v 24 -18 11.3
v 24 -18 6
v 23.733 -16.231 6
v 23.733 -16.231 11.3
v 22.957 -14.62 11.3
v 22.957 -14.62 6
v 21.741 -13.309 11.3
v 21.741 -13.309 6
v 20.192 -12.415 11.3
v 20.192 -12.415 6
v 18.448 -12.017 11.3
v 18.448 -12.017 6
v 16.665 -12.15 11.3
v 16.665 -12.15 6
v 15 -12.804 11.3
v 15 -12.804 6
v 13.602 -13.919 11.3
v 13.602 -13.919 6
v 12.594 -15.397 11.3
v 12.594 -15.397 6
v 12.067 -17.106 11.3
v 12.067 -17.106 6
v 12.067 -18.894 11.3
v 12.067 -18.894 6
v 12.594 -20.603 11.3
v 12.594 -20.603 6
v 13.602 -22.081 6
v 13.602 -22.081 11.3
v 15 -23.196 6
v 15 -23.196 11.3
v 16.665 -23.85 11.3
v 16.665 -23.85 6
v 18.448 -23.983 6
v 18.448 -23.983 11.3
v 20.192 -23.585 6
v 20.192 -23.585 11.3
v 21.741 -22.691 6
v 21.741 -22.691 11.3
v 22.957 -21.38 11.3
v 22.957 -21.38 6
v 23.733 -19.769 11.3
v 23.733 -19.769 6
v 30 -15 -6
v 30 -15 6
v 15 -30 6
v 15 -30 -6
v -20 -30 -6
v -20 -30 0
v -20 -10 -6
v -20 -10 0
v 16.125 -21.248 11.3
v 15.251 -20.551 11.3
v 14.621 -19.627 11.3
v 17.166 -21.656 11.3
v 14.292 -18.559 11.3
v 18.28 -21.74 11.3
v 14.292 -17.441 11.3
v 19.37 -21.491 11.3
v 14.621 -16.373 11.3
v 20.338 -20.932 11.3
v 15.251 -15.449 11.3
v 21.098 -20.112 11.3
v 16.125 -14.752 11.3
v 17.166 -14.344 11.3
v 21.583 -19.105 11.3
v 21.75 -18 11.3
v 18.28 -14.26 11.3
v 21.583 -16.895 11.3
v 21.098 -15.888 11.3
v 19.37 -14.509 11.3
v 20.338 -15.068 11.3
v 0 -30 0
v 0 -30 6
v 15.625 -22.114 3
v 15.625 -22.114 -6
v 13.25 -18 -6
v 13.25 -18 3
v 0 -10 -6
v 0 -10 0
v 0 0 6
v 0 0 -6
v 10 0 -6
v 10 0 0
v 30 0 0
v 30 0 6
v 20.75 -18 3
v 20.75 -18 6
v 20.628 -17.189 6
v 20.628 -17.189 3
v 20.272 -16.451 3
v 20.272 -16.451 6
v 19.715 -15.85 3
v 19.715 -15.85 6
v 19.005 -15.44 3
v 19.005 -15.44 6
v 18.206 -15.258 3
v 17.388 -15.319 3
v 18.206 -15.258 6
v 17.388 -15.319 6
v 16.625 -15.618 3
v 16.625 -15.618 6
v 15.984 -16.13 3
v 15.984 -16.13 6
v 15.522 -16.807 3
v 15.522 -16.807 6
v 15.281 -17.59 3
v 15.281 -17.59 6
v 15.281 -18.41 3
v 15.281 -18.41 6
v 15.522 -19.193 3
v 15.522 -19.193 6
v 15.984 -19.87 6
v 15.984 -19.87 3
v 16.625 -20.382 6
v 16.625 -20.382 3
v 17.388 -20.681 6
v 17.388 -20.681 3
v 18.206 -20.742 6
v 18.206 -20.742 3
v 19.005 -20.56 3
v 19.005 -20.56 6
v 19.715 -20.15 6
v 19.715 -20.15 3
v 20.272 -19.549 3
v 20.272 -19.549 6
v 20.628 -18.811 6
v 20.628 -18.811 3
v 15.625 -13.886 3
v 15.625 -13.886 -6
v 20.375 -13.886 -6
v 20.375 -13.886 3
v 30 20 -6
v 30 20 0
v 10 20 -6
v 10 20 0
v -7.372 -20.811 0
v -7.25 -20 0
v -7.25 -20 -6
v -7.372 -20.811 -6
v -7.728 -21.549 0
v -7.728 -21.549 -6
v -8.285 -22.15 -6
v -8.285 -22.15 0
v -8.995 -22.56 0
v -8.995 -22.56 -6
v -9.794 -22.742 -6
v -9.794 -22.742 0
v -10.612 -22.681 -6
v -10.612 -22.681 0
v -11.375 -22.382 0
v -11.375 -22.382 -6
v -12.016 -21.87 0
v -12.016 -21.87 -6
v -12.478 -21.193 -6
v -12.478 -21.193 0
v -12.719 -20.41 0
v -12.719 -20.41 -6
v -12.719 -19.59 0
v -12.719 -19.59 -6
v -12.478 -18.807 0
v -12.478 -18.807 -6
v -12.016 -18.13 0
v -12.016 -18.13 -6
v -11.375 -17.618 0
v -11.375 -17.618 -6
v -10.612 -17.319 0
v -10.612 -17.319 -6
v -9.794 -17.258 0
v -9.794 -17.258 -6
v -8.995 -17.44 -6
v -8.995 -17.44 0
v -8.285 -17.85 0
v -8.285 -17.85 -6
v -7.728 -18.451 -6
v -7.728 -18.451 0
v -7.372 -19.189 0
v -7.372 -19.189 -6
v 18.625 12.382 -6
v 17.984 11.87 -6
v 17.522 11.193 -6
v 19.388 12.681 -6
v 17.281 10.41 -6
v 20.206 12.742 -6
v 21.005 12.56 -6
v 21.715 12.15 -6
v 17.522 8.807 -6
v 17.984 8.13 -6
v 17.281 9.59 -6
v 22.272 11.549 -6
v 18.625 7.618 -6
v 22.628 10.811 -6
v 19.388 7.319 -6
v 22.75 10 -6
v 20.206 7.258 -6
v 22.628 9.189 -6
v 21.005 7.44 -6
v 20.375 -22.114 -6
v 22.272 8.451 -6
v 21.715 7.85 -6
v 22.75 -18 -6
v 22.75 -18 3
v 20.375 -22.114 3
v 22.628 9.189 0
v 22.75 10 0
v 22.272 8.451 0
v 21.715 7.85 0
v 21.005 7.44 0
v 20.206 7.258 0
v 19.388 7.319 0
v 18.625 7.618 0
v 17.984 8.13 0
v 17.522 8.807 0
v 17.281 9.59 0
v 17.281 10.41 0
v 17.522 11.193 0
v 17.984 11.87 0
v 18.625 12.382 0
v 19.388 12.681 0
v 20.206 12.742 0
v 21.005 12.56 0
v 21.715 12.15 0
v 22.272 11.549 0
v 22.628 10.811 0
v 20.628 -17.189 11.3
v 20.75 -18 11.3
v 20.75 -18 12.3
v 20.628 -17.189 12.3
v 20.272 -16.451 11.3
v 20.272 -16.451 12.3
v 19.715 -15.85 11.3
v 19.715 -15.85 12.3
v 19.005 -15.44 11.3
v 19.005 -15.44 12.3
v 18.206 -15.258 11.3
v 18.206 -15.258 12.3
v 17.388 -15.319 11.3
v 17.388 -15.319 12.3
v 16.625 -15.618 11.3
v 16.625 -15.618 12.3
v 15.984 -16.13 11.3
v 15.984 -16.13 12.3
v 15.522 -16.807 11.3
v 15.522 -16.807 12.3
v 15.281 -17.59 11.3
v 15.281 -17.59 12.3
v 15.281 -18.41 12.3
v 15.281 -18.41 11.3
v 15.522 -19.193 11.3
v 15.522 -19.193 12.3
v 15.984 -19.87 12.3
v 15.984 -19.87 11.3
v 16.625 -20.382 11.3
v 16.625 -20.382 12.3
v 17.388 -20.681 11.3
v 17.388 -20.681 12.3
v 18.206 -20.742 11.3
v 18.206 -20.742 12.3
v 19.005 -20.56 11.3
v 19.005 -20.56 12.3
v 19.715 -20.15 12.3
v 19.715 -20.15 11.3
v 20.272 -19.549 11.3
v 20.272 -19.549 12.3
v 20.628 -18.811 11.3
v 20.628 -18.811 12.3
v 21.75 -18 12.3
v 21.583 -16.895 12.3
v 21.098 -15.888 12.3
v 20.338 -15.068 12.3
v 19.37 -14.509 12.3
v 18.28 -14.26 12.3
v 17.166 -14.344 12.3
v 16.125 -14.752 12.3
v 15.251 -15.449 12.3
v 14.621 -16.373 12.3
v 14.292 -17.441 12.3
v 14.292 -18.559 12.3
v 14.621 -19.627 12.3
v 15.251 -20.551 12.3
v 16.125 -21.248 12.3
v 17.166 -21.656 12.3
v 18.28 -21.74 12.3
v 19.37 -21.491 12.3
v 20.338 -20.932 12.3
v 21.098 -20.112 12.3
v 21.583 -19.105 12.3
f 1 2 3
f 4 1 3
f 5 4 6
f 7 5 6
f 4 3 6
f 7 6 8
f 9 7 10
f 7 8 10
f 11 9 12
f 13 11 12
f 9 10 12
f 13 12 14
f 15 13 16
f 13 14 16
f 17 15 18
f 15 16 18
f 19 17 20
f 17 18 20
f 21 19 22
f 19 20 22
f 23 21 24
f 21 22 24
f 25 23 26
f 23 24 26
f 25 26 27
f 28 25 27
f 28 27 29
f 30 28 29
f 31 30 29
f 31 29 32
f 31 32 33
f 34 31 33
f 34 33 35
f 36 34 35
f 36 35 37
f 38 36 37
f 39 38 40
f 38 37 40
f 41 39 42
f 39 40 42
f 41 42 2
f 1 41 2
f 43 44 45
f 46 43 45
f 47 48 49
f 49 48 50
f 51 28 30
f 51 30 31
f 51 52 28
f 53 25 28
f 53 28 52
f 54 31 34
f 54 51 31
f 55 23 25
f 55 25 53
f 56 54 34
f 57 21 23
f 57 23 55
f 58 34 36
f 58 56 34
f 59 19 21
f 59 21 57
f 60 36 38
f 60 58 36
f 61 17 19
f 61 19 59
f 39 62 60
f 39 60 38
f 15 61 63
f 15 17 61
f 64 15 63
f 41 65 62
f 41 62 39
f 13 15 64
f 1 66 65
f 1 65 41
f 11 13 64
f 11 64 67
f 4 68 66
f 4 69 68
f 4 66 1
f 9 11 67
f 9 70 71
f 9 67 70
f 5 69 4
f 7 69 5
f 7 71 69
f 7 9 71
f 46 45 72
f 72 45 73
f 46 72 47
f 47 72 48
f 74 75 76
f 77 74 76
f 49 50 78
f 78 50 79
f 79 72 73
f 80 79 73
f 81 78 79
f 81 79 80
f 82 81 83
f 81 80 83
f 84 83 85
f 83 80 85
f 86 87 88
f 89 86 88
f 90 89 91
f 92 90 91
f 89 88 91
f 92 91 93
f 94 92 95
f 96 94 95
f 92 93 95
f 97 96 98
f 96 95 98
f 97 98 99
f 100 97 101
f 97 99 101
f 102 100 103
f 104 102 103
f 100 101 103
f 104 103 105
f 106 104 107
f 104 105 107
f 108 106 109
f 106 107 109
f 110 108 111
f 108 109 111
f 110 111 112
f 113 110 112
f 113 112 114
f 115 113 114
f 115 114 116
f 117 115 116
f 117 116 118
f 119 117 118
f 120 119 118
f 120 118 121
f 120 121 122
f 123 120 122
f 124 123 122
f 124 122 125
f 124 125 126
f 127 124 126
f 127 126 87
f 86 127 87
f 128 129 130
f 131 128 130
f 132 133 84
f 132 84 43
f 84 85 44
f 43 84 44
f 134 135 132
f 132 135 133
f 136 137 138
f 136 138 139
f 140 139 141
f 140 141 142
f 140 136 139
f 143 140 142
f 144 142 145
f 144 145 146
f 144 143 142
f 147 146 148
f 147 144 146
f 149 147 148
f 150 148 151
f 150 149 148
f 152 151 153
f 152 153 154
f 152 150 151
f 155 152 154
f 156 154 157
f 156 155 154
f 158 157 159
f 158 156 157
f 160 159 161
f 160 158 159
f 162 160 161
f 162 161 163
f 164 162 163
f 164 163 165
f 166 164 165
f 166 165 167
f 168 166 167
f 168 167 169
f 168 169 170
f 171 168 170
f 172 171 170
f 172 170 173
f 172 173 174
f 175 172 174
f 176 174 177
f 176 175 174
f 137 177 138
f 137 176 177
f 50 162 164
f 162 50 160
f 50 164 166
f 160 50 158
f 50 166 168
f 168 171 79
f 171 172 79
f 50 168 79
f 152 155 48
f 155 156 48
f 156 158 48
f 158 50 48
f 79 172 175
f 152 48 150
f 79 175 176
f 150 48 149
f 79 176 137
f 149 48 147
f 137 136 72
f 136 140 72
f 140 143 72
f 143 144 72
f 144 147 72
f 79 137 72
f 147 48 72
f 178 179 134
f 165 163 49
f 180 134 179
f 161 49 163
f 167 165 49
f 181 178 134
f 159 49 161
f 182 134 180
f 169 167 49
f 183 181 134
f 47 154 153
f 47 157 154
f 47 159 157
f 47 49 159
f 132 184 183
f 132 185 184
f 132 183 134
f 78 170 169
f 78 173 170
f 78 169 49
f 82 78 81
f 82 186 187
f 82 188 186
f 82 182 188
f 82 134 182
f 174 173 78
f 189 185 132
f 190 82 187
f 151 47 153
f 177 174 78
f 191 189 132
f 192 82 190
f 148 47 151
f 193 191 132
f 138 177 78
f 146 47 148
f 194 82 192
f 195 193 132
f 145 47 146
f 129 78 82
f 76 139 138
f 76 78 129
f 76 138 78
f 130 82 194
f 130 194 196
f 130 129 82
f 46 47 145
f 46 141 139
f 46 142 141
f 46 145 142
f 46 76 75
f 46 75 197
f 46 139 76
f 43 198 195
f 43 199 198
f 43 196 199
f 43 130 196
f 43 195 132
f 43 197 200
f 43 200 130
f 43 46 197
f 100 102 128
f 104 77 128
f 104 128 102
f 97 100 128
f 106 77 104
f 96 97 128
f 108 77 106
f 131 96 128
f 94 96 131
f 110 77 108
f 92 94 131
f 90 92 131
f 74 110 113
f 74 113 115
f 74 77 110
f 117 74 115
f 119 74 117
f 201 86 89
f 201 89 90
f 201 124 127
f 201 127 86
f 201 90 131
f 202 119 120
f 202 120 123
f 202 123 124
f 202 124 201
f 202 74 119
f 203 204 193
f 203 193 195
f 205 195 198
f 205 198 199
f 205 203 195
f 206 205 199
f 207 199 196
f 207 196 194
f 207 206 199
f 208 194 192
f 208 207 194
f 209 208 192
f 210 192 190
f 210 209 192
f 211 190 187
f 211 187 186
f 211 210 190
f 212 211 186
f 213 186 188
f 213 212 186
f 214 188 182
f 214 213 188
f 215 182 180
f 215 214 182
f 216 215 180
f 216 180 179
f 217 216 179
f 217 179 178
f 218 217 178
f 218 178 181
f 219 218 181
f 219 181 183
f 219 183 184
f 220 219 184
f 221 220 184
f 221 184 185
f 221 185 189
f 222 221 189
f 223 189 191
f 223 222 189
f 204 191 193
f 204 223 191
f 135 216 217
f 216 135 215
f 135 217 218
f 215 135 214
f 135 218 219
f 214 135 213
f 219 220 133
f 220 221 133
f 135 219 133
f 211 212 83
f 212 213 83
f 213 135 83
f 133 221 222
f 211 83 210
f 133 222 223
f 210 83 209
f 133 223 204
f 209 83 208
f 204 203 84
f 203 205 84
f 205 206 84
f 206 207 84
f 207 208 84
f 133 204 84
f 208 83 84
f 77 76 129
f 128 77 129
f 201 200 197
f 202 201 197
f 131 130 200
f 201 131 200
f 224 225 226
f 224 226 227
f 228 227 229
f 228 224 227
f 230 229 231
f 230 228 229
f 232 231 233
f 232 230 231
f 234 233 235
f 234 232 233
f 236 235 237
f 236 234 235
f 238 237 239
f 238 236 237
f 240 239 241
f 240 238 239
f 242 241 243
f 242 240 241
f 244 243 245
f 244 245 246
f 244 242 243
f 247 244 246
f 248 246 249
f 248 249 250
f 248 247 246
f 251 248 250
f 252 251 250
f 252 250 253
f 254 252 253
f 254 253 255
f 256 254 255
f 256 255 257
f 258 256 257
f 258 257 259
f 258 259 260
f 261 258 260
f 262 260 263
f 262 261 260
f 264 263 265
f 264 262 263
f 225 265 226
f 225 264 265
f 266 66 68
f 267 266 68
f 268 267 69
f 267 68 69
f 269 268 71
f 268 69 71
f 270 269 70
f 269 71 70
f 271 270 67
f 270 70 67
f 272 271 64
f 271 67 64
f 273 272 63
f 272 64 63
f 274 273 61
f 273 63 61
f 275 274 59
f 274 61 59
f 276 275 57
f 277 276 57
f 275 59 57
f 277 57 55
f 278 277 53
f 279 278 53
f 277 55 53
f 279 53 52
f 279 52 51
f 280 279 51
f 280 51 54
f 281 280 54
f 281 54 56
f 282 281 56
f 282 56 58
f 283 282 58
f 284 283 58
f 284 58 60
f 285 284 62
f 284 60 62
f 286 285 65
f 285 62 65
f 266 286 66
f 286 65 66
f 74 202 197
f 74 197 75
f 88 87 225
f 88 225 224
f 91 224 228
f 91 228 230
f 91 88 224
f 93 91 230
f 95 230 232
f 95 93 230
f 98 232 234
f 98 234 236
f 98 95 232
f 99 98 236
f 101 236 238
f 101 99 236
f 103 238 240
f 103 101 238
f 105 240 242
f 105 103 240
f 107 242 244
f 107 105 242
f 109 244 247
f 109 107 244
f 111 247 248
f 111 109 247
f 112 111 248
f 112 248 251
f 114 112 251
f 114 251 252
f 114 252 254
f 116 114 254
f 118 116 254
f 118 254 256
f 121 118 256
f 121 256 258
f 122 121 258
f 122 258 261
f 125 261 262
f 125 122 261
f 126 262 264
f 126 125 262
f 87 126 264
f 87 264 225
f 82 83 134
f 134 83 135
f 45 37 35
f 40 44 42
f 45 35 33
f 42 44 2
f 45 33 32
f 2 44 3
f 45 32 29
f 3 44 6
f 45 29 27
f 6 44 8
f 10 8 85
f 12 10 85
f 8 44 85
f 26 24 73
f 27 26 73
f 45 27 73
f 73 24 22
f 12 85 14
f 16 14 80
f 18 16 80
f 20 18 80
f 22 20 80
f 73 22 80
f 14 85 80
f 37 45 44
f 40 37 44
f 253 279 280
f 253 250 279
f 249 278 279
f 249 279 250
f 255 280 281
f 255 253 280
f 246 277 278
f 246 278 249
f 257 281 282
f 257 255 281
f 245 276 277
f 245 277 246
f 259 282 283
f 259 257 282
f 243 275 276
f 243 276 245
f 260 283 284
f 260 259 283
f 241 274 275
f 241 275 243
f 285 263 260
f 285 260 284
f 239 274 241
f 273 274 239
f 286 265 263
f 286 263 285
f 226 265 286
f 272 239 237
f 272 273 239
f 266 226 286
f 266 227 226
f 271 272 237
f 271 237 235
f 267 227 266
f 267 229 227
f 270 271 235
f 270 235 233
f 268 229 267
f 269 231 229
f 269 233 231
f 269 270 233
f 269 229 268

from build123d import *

# Parameters (mm, degrees)
PAD_DEPTH       = 6
SKETCH001_R     = 2.75
PAD001_DEPTH    = 6
SKETCH002_R     = 2.75
POCKET_DEPTH    = 12.001
SKETCH003_R     = 6
SKETCH003_R_2   = 2.75
PAD002_DEPTH    = 5.3
SKETCH004_R     = 3.75
SKETCH004_R_2   = 2.75
PAD003_DEPTH    = 1
POCKET001_DEPTH = 9


with BuildPart() as part:
    # Sketch → Pad (new body)
    with BuildSketch(Plane.XY):
        Polygon((0, 0), (30, 0), (30, -15), (15, -30), (0, -30), align=None)
    extrude(amount=PAD_DEPTH)

    # Sketch001 (on Face6 of Pad) → Pad001 (join)
    with BuildSketch(Plane(origin=(0, 0, 0), x_dir=(1, 0, 0), z_dir=(0, 0, -1))):
        Polygon((15, 30), (-20, 30), (-20, 10), (0, 10), (0, 0), (10, 0), (10, -20), (30, -20), (30, 15), align=None)
        with Locations((-10, 20)):
            Circle(SKETCH001_R, mode=Mode.SUBTRACT)
        with Locations((20, -10)):
            Circle(SKETCH001_R, mode=Mode.SUBTRACT)
    extrude(amount=PAD001_DEPTH)

    # Sketch002 (on Face1 of Pad001) → Pocket (cut, through all)
    with BuildSketch(Plane.XY.offset(6)):
        with Locations((18, -18)):
            Circle(SKETCH002_R)
    extrude(amount=-POCKET_DEPTH, mode=Mode.SUBTRACT)

    # Sketch003 (on Face1 of Pocket) → Pad002 (join)
    with BuildSketch(Plane.XY.offset(6)):
        with Locations((18, -18)):
            Circle(SKETCH003_R)
        with Locations((18, -18)):
            Circle(SKETCH003_R_2, mode=Mode.SUBTRACT)
    extrude(amount=PAD002_DEPTH)

    # Sketch004 (on Face15 of Pad002) → Pad003 (join)
    with BuildSketch(Plane.XY.offset(11.3)):
        with Locations((18, -18)):
            Circle(SKETCH004_R)
        with Locations((18, -18)):
            Circle(SKETCH004_R_2, mode=Mode.SUBTRACT)
    extrude(amount=PAD003_DEPTH)

    # Sketch005 (on Face10 of Pad003) → Pocket001 (cut)
    with BuildSketch(Plane(origin=(0, 0, -6), x_dir=(1, 0, 0), z_dir=(0, 0, -1))):
        Polygon((22.75, 18), (20.375, 22.113621), (15.625, 22.113621), (13.25, 18), (15.625, 13.886379), (20.375, 13.886379), align=None)
    extrude(amount=-POCKET001_DEPTH, mode=Mode.SUBTRACT)


solid = part.part
